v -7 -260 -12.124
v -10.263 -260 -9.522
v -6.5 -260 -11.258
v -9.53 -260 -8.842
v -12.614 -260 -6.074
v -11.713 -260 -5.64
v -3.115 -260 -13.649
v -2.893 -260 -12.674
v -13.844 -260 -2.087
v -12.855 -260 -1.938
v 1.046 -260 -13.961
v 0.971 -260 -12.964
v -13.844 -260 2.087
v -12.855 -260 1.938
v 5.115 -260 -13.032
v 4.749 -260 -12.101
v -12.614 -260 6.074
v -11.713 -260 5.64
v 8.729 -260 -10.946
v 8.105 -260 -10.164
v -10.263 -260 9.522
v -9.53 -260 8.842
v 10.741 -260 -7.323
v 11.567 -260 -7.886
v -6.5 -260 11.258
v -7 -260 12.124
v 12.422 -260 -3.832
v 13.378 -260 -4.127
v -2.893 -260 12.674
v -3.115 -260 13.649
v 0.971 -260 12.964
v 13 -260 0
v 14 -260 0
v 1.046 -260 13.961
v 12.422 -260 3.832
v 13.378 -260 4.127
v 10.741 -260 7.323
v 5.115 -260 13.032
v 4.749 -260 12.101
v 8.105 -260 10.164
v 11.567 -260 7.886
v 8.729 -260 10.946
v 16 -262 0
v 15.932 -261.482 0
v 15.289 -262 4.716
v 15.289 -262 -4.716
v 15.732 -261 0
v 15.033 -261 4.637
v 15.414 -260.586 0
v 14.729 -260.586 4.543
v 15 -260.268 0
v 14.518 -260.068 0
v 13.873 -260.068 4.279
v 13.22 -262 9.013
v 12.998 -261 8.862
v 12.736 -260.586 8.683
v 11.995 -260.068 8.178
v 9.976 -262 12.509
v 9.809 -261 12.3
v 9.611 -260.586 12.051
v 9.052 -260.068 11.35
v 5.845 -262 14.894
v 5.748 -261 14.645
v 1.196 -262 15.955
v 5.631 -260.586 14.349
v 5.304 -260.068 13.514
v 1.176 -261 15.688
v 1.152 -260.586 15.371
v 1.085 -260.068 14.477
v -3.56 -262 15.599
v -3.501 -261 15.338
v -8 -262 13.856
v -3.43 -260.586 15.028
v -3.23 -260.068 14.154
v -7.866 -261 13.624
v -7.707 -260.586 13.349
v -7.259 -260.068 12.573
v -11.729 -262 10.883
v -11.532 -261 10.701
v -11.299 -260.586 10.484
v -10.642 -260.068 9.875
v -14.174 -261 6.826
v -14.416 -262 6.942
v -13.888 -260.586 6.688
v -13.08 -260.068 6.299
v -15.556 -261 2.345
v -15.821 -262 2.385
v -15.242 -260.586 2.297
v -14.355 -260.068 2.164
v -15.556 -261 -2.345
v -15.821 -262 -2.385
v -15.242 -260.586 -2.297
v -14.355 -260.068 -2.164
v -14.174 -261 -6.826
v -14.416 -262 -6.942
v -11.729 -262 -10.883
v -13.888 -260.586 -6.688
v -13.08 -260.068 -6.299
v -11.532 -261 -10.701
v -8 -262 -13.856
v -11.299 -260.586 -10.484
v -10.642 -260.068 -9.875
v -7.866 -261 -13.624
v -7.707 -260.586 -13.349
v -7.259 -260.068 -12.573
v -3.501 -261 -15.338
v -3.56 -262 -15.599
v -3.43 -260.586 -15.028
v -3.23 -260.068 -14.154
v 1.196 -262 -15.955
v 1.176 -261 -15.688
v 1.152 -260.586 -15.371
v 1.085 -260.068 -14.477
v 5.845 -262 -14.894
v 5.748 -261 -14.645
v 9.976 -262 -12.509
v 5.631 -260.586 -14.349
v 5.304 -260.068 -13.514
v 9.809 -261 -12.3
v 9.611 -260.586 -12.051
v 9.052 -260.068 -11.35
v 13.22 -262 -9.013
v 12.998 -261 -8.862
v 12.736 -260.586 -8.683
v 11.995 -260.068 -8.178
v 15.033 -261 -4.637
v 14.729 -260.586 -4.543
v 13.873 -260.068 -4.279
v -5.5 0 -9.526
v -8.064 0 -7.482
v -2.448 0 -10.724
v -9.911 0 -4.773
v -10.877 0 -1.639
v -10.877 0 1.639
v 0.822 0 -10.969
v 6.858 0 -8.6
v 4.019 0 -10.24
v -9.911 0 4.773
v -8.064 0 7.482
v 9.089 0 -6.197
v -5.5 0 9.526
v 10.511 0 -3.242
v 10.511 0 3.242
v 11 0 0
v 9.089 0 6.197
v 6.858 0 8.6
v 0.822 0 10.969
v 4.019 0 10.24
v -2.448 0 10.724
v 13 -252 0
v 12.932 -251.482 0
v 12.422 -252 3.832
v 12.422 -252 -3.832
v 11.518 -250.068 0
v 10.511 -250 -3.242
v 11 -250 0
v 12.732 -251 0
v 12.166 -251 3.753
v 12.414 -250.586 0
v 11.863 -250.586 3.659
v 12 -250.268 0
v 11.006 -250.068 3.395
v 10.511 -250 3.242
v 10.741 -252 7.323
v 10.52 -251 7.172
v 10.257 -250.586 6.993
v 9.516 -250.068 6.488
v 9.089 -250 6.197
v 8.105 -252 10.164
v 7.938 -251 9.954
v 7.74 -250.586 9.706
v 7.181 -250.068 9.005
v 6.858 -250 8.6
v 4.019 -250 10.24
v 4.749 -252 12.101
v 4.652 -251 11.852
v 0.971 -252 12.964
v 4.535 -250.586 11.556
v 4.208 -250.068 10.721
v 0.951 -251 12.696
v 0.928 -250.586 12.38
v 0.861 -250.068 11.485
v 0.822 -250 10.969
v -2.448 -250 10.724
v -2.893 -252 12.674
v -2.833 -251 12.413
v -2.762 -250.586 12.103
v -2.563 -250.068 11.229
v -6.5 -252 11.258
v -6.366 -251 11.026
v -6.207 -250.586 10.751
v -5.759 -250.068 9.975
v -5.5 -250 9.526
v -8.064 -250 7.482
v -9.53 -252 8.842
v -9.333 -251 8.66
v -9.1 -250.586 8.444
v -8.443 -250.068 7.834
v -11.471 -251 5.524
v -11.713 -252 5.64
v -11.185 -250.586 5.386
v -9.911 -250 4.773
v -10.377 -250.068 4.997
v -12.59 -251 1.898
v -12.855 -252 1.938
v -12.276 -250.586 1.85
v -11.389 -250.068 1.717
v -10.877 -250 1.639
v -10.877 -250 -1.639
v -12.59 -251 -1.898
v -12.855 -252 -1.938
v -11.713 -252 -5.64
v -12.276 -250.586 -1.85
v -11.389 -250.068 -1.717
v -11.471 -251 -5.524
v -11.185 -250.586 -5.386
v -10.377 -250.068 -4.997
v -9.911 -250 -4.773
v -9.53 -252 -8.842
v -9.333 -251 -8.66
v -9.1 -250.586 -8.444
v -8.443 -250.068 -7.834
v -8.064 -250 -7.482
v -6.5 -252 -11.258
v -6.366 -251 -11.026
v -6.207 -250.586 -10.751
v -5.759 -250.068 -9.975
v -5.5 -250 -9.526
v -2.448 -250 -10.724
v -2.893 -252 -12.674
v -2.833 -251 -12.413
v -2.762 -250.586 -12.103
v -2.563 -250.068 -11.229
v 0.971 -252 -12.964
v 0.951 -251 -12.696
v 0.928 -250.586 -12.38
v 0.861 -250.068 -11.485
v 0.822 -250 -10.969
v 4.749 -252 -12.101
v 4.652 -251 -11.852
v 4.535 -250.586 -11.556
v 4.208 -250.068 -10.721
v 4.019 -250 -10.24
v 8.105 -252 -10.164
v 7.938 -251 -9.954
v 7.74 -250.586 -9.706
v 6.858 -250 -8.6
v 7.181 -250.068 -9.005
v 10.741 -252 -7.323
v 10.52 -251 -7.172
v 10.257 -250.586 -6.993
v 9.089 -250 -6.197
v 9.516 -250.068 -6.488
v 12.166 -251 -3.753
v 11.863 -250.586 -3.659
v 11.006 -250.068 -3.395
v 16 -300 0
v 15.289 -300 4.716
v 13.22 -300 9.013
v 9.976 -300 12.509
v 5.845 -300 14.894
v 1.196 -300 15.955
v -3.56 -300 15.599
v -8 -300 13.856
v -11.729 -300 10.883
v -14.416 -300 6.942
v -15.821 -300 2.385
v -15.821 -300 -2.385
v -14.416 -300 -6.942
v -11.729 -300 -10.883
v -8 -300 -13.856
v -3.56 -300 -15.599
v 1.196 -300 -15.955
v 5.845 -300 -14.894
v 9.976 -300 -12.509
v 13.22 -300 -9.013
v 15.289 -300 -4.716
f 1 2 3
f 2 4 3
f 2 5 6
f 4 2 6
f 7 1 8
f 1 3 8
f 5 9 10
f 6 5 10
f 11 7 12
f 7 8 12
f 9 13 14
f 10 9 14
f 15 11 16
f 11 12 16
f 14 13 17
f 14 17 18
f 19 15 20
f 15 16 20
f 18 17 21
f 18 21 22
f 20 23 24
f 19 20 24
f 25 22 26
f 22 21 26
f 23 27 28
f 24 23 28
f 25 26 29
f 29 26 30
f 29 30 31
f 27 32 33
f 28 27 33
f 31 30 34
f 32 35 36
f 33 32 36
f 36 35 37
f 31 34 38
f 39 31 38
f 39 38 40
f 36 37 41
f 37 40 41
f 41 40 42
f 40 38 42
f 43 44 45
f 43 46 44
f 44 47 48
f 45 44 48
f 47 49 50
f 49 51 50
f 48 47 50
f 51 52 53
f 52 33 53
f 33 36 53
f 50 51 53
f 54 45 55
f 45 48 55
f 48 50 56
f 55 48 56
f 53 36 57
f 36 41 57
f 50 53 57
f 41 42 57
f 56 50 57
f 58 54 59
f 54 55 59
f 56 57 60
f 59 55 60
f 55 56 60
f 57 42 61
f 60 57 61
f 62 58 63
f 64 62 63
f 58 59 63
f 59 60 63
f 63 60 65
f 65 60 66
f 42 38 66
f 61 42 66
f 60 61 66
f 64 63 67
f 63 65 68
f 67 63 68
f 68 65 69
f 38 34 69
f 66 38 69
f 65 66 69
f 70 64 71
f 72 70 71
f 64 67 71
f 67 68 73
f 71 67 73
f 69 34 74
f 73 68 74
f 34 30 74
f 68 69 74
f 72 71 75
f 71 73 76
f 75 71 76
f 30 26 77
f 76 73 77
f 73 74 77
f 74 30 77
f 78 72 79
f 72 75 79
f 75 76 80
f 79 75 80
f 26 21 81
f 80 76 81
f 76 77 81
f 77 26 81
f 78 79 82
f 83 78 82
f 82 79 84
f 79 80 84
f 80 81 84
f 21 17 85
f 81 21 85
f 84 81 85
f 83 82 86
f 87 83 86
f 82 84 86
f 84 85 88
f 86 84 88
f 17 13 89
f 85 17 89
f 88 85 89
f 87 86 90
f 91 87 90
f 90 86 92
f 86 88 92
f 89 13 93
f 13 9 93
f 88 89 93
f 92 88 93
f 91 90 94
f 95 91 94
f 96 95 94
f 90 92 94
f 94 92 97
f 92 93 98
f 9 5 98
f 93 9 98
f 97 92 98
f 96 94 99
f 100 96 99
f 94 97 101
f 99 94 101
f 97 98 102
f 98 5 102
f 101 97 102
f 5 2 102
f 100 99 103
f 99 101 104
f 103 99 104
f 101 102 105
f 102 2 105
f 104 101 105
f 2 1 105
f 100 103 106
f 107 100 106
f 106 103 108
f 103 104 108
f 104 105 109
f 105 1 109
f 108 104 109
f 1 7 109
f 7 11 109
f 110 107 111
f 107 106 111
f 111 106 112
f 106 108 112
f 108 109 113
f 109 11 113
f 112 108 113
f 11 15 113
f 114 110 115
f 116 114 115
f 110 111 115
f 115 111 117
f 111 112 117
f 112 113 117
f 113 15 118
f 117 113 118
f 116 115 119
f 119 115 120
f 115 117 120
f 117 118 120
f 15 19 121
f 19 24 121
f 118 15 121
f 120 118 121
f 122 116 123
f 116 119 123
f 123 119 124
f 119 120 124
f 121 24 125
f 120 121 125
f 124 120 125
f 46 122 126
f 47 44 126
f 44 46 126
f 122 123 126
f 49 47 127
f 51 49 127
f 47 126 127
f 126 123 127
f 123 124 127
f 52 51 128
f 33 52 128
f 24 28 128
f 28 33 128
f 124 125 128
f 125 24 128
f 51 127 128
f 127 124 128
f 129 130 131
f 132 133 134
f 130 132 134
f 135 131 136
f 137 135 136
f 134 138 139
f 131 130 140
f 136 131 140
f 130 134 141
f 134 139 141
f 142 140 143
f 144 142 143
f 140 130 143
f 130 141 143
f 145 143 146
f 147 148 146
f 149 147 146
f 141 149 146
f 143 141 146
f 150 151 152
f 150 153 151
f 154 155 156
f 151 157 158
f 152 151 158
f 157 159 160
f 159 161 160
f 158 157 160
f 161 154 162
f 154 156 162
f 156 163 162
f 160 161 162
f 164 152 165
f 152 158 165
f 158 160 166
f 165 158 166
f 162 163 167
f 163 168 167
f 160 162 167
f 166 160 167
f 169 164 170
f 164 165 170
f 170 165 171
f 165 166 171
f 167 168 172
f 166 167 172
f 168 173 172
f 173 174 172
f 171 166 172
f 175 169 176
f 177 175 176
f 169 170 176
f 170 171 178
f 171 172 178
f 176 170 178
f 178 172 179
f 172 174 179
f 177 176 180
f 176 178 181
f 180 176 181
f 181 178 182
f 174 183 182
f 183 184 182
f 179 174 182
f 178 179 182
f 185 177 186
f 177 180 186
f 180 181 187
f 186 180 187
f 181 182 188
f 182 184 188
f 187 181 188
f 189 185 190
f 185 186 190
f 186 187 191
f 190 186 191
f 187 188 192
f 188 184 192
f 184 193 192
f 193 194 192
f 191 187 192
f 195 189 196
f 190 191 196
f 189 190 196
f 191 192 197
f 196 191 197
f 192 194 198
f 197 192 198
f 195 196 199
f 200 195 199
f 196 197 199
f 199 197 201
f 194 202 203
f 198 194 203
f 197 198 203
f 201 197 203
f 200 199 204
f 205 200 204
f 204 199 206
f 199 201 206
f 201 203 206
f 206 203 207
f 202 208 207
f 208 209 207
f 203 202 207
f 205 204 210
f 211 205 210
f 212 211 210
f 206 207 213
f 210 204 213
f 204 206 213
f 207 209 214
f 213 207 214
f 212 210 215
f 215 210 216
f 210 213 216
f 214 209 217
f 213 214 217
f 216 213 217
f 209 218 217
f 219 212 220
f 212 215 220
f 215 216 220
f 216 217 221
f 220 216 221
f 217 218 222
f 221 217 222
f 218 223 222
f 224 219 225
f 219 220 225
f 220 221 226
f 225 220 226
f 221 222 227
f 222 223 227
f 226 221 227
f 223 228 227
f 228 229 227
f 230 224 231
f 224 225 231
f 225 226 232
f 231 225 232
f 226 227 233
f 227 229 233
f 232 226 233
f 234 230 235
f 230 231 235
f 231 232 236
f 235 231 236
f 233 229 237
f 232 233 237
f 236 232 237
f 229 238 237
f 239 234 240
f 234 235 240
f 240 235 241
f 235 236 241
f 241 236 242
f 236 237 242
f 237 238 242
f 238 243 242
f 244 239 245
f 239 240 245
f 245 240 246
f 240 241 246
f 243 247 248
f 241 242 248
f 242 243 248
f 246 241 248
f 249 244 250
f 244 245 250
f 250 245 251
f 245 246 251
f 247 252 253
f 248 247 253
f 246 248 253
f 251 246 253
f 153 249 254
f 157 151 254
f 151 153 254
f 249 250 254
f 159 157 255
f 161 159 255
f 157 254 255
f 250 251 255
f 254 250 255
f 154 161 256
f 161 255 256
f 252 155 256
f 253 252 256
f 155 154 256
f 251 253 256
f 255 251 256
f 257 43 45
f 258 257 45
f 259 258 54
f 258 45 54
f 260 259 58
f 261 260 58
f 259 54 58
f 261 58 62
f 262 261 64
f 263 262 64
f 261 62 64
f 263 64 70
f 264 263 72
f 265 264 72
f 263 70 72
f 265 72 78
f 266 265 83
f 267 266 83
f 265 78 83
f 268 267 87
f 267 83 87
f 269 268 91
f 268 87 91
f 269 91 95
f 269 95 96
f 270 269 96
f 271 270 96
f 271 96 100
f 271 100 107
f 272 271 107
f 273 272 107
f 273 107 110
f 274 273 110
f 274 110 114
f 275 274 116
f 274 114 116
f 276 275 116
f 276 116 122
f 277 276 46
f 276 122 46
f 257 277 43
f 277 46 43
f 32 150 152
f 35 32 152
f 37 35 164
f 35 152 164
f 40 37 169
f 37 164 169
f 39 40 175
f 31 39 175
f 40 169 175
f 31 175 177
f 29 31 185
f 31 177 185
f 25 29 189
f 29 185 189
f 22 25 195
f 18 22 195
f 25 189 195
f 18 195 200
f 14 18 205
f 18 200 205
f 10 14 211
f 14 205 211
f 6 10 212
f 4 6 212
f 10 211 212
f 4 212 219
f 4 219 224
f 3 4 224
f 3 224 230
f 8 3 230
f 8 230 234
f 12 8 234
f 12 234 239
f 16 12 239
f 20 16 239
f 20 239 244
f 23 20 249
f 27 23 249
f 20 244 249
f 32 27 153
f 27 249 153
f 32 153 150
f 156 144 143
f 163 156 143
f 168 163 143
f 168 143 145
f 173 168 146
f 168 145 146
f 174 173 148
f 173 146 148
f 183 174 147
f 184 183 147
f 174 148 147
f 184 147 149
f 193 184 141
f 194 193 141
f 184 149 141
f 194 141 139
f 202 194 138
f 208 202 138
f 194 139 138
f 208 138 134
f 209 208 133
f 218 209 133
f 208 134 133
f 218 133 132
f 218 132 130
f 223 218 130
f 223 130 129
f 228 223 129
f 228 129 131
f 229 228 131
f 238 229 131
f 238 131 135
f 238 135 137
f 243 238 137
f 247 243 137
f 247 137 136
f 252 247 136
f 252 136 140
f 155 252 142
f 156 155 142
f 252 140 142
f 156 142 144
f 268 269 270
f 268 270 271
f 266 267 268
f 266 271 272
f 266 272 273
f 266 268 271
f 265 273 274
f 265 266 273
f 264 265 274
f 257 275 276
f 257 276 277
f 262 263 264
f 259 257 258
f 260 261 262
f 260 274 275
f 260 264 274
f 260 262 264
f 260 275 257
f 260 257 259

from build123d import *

# Parameters (mm, degrees)
F0_R     = 11
F1_DEPTH = 250
F2_R     = 13
F2_R_2   = 11
F3_DEPTH = 10
F4_R     = 1.99999
F5_R     = 16
F5_R_2   = 13
F6_DEPTH = 40
F7_R     = 2


# Not quite as in the source:
# - a fillet or chamfer is up to 0.001 mm smaller than in the source, because OpenCascade refuses the exact size


with BuildPart() as f1:
    # F0 (on Front) → F1 (new body)
    with BuildSketch(Plane.XZ):
        Circle(F0_R)
    extrude(amount=F1_DEPTH)

    # F2 (on face) → F3 (join)
    with BuildSketch(Plane.XZ.offset(250)):
        Circle(F2_R)
        Circle(F2_R_2, mode=Mode.SUBTRACT)
        Circle(F2_R_2)
    extrude(amount=F3_DEPTH)

    # F4 (radius 2 in the source; OpenCascade refuses exactly that, so slightly less here)
    f4_edges = [f1.edges().sort_by_distance(p)[0] for p in [
        (-13, -250, 0),
    ]]
    fillet(f4_edges, radius=F4_R)

    # F5 (on face) → F6 (join)
    with BuildSketch(Plane.XZ.offset(260)):
        Circle(F5_R)
        Circle(F5_R_2, mode=Mode.SUBTRACT)
        Circle(F5_R_2)
    extrude(amount=F6_DEPTH)

    # F7
    f7_edges = [f1.edges().sort_by_distance(p)[0] for p in [
        (-16, -260, 0),
    ]]
    fillet(f7_edges, radius=F7_R)


solid = f1.part
